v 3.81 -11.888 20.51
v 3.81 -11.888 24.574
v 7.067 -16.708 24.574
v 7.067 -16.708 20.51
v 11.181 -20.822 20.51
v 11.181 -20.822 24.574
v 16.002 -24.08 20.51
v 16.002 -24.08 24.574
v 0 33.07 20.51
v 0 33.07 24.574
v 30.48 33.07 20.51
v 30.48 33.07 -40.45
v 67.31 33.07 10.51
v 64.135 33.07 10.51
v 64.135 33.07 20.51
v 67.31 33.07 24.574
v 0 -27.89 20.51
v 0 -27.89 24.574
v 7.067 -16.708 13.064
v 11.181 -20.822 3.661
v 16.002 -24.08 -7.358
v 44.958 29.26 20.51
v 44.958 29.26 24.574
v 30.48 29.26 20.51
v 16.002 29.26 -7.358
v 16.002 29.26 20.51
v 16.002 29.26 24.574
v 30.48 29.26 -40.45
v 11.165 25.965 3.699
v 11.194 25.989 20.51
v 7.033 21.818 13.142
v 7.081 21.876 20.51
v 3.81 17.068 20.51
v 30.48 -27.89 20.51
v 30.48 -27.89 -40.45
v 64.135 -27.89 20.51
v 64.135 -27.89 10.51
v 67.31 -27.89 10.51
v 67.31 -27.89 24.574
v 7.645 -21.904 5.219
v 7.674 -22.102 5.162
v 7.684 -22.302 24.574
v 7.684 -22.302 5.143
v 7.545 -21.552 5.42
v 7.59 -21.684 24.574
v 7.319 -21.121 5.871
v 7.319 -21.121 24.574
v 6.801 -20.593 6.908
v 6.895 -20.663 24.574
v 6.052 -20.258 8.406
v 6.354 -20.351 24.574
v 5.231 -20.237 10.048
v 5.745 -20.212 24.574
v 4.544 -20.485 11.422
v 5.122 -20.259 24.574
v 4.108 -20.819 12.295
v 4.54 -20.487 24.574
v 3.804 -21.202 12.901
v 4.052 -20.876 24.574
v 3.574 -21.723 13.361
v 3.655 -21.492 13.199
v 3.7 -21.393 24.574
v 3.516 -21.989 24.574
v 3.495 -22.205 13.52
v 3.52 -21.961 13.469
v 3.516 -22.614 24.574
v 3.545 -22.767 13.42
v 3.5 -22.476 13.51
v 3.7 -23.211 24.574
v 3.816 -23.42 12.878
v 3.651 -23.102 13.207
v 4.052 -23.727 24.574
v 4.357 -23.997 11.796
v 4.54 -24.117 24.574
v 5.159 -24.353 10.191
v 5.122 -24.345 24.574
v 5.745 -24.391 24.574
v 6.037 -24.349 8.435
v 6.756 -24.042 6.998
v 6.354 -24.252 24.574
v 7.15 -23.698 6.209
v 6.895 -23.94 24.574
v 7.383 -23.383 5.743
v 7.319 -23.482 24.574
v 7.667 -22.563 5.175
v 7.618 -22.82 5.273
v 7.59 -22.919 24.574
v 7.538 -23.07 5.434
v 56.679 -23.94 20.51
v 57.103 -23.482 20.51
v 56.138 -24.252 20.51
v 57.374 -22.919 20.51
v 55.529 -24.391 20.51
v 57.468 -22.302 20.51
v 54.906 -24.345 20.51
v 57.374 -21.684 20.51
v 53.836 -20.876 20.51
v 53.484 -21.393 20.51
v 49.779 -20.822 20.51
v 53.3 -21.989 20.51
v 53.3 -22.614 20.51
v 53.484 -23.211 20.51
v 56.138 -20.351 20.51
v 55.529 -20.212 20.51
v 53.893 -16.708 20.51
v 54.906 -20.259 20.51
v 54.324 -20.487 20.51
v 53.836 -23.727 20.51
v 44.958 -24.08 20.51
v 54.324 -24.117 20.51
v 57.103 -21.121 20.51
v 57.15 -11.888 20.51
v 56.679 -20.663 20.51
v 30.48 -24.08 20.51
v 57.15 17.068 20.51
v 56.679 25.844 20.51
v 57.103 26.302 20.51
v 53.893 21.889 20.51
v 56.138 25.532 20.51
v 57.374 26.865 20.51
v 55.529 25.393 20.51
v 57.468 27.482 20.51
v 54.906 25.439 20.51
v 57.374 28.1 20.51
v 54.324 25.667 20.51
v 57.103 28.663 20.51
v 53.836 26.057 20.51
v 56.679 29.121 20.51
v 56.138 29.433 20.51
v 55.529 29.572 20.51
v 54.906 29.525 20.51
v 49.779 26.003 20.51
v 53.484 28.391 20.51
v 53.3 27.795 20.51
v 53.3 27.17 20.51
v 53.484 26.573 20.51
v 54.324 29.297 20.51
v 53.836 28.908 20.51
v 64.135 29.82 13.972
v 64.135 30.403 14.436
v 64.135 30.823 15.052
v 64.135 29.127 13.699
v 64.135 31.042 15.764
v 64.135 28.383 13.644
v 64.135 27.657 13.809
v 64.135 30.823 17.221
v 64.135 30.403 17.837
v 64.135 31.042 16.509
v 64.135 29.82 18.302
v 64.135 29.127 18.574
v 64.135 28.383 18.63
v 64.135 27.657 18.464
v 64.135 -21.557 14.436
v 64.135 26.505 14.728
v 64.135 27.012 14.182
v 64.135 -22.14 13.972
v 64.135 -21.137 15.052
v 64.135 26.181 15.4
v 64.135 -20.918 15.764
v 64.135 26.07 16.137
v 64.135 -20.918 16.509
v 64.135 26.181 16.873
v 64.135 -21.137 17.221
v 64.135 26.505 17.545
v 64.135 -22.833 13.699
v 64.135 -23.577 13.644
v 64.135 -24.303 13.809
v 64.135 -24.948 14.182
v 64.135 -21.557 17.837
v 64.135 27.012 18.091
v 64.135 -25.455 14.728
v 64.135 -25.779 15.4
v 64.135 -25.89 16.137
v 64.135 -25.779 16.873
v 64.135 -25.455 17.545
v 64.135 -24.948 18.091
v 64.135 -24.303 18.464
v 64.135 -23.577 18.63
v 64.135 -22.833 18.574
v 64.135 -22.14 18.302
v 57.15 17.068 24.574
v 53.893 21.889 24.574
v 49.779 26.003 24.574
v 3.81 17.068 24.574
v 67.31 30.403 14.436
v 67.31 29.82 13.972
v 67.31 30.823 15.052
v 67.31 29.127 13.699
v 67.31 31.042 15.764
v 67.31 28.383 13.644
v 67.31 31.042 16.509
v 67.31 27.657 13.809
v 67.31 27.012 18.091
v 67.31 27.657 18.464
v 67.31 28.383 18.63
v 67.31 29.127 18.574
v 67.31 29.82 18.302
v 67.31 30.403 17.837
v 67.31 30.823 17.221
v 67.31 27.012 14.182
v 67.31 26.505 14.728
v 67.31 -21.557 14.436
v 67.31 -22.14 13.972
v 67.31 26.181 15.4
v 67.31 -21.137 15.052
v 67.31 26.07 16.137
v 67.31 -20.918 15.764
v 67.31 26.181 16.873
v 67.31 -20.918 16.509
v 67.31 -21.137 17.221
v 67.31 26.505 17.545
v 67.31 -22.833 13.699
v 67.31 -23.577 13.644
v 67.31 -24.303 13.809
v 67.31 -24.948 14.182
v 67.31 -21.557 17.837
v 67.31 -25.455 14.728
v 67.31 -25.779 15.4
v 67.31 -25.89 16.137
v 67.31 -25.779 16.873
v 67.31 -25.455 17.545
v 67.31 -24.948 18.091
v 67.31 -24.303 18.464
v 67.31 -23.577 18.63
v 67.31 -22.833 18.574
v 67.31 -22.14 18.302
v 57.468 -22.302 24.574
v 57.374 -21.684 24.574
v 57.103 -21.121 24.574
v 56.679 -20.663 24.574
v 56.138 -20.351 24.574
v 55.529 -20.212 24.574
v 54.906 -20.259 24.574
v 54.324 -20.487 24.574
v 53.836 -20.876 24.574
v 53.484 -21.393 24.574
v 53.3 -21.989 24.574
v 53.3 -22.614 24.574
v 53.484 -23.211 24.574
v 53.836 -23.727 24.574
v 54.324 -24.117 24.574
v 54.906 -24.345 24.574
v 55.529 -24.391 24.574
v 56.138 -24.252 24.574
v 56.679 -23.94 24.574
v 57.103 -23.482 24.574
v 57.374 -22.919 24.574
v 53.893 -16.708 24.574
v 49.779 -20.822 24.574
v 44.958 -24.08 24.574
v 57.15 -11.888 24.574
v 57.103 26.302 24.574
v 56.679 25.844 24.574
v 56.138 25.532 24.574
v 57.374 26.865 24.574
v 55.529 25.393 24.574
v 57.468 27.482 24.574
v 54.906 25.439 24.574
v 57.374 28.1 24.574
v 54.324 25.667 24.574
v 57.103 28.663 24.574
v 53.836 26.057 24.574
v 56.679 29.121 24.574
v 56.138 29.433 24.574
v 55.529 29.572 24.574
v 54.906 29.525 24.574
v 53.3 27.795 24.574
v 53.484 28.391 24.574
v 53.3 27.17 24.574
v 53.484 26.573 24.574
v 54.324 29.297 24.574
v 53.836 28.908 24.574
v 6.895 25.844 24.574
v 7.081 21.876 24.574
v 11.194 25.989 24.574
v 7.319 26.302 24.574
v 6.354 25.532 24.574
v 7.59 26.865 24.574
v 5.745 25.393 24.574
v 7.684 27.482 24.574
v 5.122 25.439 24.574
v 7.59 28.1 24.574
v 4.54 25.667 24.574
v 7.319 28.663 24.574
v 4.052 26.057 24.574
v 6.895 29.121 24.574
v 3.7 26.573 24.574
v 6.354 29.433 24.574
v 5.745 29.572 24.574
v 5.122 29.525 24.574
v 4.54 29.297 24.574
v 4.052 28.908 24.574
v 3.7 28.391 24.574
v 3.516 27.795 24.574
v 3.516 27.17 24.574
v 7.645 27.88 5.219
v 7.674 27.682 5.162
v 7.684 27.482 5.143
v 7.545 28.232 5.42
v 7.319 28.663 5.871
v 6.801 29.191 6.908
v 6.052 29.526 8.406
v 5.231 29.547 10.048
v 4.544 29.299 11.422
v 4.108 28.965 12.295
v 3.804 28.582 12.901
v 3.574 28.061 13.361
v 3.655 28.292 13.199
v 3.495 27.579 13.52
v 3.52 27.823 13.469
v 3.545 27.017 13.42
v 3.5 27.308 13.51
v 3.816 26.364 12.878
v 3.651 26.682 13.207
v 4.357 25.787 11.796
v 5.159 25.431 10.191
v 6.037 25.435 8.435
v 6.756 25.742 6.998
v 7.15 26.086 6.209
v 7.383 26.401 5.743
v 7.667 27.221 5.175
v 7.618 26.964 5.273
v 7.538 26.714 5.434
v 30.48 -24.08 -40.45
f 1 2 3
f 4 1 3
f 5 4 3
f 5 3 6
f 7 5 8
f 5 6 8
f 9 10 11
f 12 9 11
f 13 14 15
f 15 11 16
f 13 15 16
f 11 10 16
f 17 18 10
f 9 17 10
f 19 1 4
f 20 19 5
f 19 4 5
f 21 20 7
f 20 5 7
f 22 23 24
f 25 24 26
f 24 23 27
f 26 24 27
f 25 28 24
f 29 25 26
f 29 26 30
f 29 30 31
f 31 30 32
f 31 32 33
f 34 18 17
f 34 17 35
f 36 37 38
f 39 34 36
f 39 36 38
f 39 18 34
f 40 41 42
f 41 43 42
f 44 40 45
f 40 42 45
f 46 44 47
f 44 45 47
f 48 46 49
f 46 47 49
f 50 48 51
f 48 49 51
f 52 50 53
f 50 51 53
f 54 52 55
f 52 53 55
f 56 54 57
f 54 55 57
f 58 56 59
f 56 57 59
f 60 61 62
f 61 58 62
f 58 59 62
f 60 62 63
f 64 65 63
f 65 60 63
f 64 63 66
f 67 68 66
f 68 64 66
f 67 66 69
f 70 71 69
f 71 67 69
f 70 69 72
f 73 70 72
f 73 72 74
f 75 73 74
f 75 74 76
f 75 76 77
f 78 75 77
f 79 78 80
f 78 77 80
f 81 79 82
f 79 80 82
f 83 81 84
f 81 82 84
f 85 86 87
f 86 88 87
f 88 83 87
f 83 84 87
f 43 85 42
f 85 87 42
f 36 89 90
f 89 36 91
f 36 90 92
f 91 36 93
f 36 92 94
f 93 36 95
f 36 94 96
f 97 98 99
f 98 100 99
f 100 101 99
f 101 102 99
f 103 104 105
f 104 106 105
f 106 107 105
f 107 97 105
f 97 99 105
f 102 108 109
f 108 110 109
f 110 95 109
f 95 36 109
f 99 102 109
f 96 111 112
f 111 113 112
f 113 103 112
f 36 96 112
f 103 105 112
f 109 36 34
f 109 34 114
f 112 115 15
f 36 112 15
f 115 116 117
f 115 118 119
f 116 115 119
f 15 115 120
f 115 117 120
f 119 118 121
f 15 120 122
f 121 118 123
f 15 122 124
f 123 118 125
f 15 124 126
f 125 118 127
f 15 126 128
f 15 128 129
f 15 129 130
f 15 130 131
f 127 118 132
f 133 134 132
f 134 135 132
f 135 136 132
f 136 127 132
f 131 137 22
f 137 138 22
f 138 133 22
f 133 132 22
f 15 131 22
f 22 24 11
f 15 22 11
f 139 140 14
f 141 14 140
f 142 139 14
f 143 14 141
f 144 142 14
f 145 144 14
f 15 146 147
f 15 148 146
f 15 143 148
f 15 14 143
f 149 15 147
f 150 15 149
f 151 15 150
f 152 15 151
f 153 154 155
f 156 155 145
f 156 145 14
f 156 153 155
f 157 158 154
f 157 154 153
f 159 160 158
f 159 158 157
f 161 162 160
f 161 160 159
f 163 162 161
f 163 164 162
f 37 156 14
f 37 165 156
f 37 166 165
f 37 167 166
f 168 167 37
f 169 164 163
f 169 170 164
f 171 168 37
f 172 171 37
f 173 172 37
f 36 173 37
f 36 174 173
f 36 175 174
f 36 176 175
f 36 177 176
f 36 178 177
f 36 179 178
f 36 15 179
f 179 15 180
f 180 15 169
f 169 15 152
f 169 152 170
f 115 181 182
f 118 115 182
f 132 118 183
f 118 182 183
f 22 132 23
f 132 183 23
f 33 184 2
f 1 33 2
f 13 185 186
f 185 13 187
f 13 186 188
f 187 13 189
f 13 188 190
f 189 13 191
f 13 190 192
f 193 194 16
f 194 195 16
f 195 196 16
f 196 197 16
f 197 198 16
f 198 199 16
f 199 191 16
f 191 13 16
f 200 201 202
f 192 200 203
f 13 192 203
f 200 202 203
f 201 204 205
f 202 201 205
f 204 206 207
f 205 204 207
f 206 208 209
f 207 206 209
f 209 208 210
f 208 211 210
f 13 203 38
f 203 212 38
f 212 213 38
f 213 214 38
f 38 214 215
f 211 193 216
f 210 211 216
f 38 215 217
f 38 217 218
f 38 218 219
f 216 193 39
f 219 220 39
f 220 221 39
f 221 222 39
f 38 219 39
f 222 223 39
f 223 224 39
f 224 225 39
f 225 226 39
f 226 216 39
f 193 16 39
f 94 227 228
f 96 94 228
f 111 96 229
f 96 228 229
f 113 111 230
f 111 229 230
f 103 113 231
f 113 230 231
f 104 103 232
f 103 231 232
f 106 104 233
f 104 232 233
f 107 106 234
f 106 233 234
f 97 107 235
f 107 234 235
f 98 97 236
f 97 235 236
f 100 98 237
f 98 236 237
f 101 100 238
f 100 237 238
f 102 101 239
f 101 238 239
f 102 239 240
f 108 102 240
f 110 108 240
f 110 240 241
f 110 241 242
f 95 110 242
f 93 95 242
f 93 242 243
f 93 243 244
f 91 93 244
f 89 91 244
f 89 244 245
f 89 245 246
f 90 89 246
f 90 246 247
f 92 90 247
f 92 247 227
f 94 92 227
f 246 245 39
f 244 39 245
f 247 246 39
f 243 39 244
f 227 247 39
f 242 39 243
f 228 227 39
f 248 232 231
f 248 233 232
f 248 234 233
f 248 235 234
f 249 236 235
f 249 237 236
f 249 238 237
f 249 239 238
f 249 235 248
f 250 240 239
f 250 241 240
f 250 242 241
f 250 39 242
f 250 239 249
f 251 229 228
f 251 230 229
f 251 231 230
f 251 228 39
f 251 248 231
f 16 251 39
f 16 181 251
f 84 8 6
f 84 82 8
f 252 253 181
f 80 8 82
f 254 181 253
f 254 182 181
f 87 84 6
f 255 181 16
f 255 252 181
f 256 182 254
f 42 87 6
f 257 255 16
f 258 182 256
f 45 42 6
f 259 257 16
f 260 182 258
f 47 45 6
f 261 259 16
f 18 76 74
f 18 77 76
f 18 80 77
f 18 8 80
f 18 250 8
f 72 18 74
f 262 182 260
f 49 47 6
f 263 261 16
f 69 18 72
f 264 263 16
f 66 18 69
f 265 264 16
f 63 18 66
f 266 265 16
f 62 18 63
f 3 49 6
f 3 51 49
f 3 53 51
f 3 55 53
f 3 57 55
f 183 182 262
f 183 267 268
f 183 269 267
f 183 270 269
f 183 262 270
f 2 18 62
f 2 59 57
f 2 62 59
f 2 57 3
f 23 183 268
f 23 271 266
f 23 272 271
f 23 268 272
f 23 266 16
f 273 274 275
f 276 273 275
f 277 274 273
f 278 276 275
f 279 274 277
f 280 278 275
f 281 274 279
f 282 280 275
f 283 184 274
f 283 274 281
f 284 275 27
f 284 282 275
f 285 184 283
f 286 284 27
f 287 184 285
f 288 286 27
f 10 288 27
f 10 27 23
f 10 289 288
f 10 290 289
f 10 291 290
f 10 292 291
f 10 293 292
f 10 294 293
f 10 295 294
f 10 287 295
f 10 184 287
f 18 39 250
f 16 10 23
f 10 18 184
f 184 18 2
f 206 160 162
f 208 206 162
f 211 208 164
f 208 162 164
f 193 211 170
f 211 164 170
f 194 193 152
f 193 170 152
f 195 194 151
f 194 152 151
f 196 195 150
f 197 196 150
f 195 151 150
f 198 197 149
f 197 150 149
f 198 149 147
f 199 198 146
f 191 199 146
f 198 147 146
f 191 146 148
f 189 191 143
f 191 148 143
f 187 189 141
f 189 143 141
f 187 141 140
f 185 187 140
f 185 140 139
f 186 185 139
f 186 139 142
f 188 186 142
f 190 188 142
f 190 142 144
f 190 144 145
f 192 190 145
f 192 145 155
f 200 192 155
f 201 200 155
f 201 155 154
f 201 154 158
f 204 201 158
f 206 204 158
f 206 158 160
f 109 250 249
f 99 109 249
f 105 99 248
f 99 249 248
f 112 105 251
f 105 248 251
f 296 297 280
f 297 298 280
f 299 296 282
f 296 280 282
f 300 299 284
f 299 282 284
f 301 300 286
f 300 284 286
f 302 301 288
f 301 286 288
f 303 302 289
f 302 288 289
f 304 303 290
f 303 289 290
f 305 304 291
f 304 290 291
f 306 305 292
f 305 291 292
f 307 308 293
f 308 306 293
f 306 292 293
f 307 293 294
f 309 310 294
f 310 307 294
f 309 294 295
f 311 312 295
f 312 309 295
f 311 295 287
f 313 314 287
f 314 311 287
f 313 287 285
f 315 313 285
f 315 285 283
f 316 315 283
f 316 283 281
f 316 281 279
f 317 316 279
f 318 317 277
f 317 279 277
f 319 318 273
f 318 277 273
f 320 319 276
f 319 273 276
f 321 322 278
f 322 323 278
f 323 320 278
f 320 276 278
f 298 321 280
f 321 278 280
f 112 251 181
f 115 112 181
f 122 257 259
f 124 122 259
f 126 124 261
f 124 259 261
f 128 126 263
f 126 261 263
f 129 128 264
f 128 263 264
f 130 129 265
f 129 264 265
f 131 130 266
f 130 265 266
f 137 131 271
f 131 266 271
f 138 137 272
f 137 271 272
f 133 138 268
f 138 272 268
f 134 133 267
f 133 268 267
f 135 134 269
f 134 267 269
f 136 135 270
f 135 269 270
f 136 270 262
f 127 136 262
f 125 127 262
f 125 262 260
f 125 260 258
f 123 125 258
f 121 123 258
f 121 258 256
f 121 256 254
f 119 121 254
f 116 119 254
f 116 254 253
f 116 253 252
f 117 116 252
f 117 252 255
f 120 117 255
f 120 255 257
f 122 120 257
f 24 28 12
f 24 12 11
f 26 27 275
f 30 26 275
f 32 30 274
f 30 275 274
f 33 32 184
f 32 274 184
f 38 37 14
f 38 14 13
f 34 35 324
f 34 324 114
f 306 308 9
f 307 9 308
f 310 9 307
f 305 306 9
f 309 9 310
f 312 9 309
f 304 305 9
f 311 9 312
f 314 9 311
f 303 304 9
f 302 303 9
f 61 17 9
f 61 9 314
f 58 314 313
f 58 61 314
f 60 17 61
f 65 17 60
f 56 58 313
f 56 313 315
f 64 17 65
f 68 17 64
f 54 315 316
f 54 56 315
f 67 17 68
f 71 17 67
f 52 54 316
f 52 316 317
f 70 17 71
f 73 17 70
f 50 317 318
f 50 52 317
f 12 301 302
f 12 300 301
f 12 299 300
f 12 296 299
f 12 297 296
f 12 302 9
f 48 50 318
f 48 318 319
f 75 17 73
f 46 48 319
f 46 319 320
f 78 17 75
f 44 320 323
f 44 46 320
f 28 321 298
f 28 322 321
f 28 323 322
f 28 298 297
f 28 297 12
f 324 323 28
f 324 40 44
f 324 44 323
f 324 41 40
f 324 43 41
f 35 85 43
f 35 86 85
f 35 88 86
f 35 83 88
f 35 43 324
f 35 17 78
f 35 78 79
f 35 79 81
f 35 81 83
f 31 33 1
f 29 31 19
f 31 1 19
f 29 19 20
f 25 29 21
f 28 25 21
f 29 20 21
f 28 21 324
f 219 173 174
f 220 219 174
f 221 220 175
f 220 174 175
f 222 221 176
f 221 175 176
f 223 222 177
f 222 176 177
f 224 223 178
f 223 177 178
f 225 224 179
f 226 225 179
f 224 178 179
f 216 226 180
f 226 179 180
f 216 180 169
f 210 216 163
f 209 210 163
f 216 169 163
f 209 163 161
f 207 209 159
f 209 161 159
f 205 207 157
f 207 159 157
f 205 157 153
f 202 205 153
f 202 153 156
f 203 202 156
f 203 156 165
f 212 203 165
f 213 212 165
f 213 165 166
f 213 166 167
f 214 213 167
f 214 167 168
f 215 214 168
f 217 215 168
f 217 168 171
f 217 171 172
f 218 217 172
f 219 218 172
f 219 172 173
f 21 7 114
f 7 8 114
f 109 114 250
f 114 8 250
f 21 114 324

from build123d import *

# Parameters (mm, degrees)
F0_W        = 60.96
F0_H        = 4.064
F1_DEPTH    = 60.96
F3_DEPTH    = 25.4
F6_DEPTH    = 60.96
F7_T4_DEPTH = 53.34
F7_S5_R     = 30.988
F7_T6_DEPTH = 44
F7_S7_R     = 30.48
F7_T8_DEPTH = 44
F8_W        = 60.96
F8_H        = 4.064
F9_DEPTH    = 6.35
F10_W       = 3.175
F10_H       = 60.96
F11_DEPTH   = 10
F4_R        = 2.0955
F14_DEPTH   = 65.025
F13_R       = 2.5
F15_DEPTH   = 25.4
F12_R       = 2.5
F16_DEPTH   = 25.4


# Not quite as in the source:
# - a fillet or chamfer that OpenCascade refuses, or shapes differently, is made with other operations: its cross-section is extruded or revolved along the edge and cut away or added


with BuildPart() as f1:
    # F0 (on Right) → F1 (new body)
    with BuildSketch(Plane.YZ):
        with Locations((2.5902520865, 22.5415869818)):
            Rectangle(F0_W, F0_H)
    extrude(amount=F1_DEPTH)

    # F2 (on face) → F3 (cut)
    with BuildSketch(Plane.XY.offset(24.5735869818)):
        with BuildLine():
            Line((16.002, -24.0797479135), (44.958, -24.0797479135))
            ThreePointArc((44.958, -24.0797479135), (51.934072902, -18.8638208155), (57.15, -11.8877479135))
            Line((57.15, -11.8877479135), (57.15, 17.0682520865))
            ThreePointArc((57.15, 17.0682520865), (51.934072902, 24.0443249885), (44.958, 29.2602520865))
            Line((44.958, 29.2602520865), (16.002, 29.2602520865))
            ThreePointArc((16.002, 29.2602520865), (9.0409528702, 24.0292992163), (3.81, 17.0682520865))
            Line((3.81, 17.0682520865), (3.81, -11.8877479135))
            ThreePointArc((3.81, -11.8877479135), (9.025927098, -18.8638208155), (16.002, -24.0797479135))
        make_face()
    extrude(amount=-F3_DEPTH, mode=Mode.SUBTRACT)

    # F5 (on face) → F6 (join)
    with BuildSketch(Plane.XZ.offset(27.8897479135)):
        Polygon((30.48, -40.4504130182), (30.48, 20.5095869818), (0, 20.5095869818), align=None)
    extrude(amount=-F6_DEPTH)

    # F7: chamfer of 60.96 x 26.67 on 1 edges, made by hand


with BuildPart() as f7_tool2:
    # F7_s3 → F7_t4 (new body)
    with BuildSketch(Plane.XZ.offset(24.0797479135)):
        Polygon((3.81, 20.5095869818), (30.48, -40.4504130182), (30.48, 20.5095869818), align=None)
    extrude(amount=-F7_T4_DEPTH)

    # F7_s5 → F7_t6 (intersect, symmetric)
    with BuildSketch(Plane.XY.offset(-10)):
        with Locations((30.9527778056, 2.1174742809)):
            Circle(F7_S5_R)
    extrude(amount=F7_T6_DEPTH, both=True, mode=Mode.INTERSECT)

    # F7_s7 → F7_t8 (intersect, symmetric)
    with BuildSketch(Plane.XY.offset(-10)):
        with Locations((30.5785417886, 2.6887938751)):
            Circle(F7_S7_R)
    extrude(amount=F7_T8_DEPTH, both=True, mode=Mode.INTERSECT)


with BuildPart() as f1_1:
    add(f1.part)

    # F7_t1: cut F7_tool2
    add(f7_tool2.part, mode=Mode.SUBTRACT)

    # F8 (on face) → F9 (join)
    with BuildSketch(Plane.YZ.offset(60.96)):
        with Locations((2.5902520865, 22.5415869818)):
            Rectangle(F8_W, F8_H)
    extrude(amount=F9_DEPTH)

    # F10 (on face) → F11 (join)
    with BuildSketch(Plane(origin=(0, 0, 20.5095869818), x_dir=(1, 0, 0), z_dir=(0, 0, -1))):
        with Locations((65.7225, -2.5902520865)):
            Rectangle(F10_W, F10_H)
    extrude(amount=F11_DEPTH)

    # F4 (on face) → F14 (cut, through all)
    with BuildSketch(Plane.XY.offset(24.5735869818)):
        with Locations((55.372, -22.3017479135)):
            Circle(F4_R)
        with Locations((55.372, 27.4822520865)):
            Circle(F4_R)
        with Locations((5.588, -22.3017479135)):
            Circle(F4_R)
        with Locations((5.588, 27.4822520865)):
            Circle(F4_R)
    extrude(amount=-F14_DEPTH, mode=Mode.SUBTRACT)

    # F13 (on face) → F15 (cut)
    with BuildSketch(Plane(origin=(64.135, 0, 0), x_dir=(0, -1, 0), z_dir=(-1, 0, 0))):
        with Locations((23.3897479135, 16.1365869818)):
            Circle(F13_R)
    extrude(amount=-F15_DEPTH, mode=Mode.SUBTRACT)

    # F12 (on face) → F16 (cut)
    with BuildSketch(Plane(origin=(64.135, 0, 0), x_dir=(0, -1, 0), z_dir=(-1, 0, 0))):
        with Locations((-28.5702520865, 16.1365869818)):
            Circle(F12_R)
    extrude(amount=-F16_DEPTH, mode=Mode.SUBTRACT)


solid = f1_1.part
